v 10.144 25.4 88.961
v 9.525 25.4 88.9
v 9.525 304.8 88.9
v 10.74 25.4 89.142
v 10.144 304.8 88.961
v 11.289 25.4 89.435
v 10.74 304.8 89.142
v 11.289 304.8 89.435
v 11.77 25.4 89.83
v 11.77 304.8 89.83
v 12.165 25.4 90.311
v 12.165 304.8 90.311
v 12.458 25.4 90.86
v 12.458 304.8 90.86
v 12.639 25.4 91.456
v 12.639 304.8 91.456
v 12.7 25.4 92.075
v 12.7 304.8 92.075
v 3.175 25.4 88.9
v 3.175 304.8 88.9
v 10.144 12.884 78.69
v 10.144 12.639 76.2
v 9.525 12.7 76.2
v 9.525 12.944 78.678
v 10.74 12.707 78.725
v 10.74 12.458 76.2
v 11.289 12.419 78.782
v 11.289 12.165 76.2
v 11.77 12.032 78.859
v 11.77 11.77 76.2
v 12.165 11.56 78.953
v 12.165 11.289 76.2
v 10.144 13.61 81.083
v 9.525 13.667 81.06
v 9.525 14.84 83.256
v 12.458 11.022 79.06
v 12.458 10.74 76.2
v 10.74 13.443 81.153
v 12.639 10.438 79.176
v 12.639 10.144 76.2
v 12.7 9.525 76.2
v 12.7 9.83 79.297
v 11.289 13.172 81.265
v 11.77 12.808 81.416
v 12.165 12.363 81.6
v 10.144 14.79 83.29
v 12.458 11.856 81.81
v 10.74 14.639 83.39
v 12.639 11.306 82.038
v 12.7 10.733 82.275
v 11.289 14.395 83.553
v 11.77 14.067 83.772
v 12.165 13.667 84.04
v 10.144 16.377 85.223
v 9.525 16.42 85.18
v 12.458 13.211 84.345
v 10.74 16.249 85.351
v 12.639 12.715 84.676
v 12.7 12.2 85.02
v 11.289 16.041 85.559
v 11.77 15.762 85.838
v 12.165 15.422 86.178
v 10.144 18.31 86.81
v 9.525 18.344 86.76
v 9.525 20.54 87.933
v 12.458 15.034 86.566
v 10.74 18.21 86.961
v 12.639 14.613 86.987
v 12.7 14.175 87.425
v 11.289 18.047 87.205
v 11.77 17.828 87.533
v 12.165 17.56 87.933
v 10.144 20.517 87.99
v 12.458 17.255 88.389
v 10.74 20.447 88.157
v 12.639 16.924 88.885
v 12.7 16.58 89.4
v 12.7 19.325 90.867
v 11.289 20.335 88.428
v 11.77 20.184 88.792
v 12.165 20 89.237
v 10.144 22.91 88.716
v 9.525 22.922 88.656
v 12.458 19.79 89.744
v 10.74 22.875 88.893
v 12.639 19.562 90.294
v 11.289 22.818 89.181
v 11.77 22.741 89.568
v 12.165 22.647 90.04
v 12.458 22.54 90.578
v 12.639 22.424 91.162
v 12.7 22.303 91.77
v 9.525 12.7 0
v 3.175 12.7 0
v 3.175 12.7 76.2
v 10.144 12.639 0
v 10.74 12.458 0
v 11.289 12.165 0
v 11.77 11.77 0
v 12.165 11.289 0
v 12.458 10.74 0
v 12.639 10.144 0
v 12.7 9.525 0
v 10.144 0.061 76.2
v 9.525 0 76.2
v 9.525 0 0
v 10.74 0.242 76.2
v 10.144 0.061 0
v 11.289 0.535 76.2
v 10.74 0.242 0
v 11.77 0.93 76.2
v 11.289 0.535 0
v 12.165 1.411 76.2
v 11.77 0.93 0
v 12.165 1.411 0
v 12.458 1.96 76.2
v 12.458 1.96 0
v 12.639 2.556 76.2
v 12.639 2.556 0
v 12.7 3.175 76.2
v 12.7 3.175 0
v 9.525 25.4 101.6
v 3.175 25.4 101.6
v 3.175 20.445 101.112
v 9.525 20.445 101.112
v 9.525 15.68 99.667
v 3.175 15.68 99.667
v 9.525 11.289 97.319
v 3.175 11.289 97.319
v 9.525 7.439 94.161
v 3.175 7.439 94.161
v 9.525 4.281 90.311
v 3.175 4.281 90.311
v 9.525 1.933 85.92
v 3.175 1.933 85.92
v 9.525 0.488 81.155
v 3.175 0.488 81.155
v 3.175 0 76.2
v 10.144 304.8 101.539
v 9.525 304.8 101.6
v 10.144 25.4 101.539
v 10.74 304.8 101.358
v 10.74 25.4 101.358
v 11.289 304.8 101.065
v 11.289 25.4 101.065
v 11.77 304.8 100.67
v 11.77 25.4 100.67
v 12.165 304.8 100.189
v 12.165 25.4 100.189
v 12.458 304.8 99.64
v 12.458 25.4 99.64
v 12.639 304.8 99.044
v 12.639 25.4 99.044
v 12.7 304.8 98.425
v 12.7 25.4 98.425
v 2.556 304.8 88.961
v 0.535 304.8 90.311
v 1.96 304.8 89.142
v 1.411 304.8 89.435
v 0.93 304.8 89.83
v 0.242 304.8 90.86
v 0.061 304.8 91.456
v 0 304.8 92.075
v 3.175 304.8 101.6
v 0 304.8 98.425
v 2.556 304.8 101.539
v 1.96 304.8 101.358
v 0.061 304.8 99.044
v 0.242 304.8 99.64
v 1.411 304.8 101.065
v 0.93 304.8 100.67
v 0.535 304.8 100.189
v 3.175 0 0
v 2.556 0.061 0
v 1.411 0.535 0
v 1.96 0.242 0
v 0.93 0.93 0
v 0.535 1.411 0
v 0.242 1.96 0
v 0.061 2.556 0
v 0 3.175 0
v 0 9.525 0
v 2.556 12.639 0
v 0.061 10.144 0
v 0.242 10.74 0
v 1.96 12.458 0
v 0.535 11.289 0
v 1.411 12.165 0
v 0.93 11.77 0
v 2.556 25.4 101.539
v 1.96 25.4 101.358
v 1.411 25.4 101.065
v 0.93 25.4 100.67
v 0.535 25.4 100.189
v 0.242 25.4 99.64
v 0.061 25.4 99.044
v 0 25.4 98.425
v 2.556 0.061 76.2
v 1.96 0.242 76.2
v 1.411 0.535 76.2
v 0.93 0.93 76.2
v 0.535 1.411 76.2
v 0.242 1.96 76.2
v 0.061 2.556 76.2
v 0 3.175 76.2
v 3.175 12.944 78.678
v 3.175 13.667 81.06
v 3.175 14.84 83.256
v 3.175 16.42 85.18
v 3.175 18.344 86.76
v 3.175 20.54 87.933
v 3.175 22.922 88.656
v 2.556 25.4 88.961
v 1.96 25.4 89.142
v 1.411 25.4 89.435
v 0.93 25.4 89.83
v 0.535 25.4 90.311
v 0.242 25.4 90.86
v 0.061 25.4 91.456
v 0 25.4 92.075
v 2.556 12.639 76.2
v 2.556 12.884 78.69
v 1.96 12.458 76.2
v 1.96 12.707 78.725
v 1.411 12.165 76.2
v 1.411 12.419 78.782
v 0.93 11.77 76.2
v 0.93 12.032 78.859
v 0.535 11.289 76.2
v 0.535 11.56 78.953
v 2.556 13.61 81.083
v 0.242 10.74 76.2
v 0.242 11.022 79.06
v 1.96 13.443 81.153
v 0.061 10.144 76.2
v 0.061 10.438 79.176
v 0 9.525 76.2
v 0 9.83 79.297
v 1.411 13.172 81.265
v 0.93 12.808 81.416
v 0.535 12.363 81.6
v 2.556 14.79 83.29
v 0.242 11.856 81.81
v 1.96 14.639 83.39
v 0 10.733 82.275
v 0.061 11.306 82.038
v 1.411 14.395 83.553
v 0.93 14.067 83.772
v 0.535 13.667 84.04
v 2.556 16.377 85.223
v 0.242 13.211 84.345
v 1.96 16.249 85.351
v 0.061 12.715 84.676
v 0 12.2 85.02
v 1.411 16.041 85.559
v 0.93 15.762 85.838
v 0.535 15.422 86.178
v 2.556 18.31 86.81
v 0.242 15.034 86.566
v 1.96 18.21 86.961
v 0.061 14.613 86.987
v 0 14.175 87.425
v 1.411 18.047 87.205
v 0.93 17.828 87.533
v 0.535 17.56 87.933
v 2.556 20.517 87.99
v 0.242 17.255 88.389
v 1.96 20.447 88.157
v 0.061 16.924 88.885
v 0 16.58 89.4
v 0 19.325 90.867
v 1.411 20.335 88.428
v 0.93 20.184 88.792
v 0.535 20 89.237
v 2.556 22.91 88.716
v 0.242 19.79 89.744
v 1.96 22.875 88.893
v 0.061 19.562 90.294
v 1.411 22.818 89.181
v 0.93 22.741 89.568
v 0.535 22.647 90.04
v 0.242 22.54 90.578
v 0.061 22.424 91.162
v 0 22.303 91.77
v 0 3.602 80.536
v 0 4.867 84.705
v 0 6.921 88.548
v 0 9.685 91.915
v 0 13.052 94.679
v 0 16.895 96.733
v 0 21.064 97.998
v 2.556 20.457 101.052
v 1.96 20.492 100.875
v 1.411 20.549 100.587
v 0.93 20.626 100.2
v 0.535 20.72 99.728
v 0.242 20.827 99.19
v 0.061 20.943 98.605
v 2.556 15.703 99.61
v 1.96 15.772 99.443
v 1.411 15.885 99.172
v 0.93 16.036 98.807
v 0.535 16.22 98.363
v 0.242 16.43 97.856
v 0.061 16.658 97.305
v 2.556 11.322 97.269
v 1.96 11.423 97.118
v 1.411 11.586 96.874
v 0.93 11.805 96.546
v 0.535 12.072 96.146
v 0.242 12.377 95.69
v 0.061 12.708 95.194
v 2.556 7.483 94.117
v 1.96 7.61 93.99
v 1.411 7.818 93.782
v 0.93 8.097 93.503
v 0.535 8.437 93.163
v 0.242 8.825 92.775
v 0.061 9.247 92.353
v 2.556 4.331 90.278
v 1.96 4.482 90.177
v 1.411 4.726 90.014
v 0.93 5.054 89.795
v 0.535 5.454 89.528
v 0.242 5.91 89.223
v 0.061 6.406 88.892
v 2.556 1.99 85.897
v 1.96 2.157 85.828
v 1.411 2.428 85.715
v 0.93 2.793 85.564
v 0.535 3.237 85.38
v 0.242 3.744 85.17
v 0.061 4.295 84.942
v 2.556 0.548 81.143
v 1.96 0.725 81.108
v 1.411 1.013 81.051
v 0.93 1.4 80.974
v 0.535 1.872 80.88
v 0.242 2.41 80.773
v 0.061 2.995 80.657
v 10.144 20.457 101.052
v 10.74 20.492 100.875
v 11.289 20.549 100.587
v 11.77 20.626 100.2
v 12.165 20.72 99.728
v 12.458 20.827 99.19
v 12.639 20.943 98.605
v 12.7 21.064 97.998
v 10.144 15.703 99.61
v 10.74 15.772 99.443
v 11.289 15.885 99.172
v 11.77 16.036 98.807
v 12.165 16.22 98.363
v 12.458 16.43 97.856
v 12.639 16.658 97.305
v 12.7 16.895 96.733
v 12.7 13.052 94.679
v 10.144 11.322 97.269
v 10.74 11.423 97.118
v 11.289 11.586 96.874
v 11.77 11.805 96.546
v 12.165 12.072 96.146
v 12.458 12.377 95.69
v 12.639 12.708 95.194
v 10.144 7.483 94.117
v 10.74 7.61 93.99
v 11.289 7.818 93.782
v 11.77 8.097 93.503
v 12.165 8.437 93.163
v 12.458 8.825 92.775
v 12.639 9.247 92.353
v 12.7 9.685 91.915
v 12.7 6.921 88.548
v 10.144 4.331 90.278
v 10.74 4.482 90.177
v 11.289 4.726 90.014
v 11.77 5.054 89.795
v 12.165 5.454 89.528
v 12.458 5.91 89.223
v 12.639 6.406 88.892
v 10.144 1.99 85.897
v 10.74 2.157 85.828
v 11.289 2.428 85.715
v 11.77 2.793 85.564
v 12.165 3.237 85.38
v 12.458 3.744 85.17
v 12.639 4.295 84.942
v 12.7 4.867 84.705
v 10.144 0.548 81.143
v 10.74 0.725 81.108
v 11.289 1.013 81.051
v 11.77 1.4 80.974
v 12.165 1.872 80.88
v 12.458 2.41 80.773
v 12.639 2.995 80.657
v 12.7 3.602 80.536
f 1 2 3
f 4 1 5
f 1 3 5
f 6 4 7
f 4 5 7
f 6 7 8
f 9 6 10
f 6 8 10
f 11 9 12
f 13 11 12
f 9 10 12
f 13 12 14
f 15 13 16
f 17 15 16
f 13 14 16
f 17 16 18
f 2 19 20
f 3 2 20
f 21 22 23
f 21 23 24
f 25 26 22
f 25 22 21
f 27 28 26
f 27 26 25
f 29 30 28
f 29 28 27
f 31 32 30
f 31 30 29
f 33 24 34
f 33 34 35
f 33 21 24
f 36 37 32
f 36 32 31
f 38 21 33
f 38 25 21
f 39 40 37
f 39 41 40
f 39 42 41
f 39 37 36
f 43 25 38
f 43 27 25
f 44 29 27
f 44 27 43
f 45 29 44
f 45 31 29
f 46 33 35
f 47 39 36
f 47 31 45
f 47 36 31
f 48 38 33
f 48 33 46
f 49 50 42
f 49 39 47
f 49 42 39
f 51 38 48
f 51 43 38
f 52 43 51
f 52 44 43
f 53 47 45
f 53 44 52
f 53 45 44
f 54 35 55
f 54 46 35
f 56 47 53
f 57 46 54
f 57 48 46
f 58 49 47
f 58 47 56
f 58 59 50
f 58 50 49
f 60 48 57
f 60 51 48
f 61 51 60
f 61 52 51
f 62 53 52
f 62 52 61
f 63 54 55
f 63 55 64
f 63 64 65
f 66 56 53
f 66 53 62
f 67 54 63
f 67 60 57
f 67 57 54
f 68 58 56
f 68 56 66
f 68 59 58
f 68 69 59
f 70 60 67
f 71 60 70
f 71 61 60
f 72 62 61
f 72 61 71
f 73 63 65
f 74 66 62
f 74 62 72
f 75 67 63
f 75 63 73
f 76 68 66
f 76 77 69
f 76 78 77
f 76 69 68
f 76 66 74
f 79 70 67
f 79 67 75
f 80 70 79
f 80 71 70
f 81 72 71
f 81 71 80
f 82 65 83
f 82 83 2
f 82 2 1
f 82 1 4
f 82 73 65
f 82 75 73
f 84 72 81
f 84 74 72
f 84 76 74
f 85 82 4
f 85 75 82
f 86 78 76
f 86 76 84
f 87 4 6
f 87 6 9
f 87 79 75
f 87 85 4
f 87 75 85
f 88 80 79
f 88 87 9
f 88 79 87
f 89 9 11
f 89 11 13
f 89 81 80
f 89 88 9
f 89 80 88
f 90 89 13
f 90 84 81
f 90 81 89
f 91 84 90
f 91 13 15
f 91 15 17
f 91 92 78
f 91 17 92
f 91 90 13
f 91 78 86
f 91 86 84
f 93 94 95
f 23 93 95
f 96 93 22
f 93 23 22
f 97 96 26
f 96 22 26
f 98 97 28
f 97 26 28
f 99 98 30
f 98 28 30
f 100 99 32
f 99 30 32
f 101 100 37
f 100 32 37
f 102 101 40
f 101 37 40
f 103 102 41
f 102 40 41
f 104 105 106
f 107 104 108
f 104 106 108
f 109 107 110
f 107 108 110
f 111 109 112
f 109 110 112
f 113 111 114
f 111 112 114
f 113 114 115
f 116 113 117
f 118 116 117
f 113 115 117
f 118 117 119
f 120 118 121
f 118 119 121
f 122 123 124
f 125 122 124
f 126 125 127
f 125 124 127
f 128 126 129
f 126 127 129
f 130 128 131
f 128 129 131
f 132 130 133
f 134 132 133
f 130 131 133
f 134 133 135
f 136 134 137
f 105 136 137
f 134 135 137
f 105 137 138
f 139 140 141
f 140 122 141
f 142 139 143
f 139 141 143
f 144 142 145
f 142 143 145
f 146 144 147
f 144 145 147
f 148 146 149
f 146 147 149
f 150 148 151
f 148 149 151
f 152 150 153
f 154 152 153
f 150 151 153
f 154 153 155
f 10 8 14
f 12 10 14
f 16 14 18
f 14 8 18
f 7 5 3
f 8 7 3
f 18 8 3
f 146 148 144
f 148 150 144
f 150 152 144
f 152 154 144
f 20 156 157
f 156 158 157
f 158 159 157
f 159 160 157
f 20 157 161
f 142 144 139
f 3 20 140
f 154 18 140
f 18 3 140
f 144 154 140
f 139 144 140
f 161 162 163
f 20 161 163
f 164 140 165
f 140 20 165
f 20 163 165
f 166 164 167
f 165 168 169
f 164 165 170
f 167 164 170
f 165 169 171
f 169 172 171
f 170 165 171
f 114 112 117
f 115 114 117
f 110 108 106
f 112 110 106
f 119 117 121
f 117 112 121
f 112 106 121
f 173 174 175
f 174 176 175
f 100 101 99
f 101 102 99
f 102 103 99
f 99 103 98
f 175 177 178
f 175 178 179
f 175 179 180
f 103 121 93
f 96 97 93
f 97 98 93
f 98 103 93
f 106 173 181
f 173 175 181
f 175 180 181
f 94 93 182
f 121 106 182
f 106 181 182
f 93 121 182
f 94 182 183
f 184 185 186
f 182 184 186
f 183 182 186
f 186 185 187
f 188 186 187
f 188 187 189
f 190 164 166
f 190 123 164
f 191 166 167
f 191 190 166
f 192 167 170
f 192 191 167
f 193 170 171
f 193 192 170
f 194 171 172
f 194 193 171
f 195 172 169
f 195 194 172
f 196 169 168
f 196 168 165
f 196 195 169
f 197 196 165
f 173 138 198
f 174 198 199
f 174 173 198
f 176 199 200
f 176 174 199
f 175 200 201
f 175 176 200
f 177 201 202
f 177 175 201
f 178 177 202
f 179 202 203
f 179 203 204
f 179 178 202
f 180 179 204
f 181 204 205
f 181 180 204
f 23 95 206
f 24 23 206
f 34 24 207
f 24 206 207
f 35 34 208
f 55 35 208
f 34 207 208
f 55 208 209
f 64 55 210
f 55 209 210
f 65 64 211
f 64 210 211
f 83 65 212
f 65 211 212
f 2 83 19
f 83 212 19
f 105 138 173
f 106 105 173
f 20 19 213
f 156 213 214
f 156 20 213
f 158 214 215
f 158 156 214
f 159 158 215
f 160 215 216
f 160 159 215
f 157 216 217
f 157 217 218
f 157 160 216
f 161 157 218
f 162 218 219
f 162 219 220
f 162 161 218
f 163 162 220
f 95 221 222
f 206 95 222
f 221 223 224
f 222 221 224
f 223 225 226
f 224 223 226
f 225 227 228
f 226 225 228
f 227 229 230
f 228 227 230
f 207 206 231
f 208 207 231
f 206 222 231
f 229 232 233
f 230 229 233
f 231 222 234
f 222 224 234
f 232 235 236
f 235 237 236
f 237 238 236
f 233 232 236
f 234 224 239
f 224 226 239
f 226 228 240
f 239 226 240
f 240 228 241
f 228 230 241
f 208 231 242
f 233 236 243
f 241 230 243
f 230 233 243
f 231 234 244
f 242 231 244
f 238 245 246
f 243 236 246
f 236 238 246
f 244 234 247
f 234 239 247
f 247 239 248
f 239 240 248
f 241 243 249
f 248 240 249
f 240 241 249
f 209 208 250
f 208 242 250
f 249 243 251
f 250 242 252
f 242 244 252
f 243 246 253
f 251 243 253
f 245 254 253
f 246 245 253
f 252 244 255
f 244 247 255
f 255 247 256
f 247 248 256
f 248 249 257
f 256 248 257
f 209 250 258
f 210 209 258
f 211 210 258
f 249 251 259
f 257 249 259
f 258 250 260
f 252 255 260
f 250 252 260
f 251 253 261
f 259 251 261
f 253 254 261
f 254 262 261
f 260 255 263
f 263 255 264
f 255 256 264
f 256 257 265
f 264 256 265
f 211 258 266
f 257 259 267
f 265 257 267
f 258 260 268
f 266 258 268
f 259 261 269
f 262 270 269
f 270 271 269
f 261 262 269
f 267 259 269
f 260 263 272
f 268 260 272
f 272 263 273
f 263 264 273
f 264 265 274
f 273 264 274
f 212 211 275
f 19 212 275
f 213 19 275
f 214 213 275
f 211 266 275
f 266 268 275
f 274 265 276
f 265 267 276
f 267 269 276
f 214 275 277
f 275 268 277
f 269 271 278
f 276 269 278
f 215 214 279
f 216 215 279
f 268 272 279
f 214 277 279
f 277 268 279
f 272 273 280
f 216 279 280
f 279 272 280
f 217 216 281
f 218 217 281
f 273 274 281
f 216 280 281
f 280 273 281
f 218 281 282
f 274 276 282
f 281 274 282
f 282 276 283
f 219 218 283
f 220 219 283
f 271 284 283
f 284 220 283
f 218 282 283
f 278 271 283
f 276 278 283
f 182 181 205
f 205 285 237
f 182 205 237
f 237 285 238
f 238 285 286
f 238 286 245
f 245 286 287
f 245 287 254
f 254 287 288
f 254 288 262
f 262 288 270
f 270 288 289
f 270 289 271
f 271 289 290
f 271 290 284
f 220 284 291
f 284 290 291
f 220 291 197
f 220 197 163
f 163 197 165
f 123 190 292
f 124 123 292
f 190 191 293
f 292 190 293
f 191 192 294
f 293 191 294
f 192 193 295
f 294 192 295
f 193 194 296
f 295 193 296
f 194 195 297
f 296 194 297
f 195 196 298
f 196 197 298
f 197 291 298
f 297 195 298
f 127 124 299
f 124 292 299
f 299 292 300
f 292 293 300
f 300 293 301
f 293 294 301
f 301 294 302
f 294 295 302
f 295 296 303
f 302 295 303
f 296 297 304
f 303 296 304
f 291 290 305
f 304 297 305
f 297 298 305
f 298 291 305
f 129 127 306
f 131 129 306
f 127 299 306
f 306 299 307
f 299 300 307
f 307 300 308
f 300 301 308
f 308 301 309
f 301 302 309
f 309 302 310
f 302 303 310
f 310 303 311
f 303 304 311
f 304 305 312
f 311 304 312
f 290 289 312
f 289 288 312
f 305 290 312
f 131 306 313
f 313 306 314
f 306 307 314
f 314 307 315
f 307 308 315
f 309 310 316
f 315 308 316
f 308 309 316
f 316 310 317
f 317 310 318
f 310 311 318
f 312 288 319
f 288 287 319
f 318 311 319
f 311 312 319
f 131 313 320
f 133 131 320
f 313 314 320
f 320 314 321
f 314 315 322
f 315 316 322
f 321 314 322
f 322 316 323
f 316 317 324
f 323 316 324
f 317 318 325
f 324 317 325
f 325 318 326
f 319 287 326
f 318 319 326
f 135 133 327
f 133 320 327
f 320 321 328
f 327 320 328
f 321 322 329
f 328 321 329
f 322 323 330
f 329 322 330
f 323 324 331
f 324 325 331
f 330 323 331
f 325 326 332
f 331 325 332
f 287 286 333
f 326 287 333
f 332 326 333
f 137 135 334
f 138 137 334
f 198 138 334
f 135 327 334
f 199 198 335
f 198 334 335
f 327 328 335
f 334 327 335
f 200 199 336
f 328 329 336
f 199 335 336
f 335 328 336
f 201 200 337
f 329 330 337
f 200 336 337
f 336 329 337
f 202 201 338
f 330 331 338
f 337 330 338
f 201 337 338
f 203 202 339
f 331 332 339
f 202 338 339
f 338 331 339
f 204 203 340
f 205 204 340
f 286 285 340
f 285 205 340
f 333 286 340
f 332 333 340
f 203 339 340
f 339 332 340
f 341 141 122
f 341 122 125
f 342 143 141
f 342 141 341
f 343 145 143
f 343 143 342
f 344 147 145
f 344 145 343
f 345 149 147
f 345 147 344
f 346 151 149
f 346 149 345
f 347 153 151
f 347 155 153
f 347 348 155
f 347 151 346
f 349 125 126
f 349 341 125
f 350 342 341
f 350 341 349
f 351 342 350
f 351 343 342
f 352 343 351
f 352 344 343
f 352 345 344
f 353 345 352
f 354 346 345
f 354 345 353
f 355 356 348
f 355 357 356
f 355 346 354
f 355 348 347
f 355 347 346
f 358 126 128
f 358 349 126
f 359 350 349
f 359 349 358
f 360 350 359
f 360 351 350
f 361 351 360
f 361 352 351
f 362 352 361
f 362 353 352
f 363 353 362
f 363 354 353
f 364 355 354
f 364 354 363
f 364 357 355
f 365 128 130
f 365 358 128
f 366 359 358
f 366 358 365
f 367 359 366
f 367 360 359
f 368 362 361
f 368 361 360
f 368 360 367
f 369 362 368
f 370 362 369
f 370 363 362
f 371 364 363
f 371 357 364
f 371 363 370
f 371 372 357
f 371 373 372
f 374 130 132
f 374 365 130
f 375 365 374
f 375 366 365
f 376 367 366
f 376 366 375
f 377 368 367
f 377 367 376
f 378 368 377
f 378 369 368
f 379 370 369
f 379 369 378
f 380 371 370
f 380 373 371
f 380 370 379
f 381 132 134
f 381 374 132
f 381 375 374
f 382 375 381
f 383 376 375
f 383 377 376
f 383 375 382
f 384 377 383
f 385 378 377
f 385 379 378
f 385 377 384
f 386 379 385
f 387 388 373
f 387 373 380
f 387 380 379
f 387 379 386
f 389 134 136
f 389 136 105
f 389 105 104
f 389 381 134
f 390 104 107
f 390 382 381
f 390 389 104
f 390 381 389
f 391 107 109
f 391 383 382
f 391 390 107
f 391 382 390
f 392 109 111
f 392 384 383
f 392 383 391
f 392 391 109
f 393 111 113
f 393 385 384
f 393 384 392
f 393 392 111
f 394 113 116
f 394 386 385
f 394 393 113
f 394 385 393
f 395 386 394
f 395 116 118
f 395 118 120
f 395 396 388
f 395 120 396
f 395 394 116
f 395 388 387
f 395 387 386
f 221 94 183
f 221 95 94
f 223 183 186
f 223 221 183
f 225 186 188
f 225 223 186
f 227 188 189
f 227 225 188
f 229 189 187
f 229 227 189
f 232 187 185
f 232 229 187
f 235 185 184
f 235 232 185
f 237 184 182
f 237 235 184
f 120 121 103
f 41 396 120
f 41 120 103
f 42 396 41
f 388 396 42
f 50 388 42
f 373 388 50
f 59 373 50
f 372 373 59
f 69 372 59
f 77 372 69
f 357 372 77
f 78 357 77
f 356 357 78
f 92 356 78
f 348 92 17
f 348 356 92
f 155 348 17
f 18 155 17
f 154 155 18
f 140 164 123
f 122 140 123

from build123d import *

# Parameters (mm, degrees)
F1_DEPTH = 12.7
F2_R     = 3.175


with BuildPart() as f1:
    # F0 (on Right) → F1 (new body)
    with BuildSketch(Plane.YZ):
        with BuildLine():
            Line((0, 76.2), (0, 0))
            Line((0, 0), (12.7, 0))
            Line((12.7, 0), (12.7, 76.2))
            ThreePointArc((12.7, 76.2), (16.419744, 85.180256), (25.4, 88.9))
            Line((25.4, 88.9), (304.8, 88.9))
            Line((304.8, 88.9), (304.8, 101.6))
            Line((304.8, 101.6), (25.4, 101.6))
            ThreePointArc((25.4, 101.6), (7.439488, 94.160512), (0, 76.2))
        make_face()
    extrude(amount=F1_DEPTH)

    # F2
    f2_edges = [f1.edges().sort_by_distance(p)[0] for p in [
        (12.7, 7.439488, 94.160512),
        (12.7, 165.1, 88.9),
        (0, 165.1, 101.6),
        (0, 165.1, 88.9),
    ]]
    fillet(f2_edges, radius=F2_R)


solid = f1.part
